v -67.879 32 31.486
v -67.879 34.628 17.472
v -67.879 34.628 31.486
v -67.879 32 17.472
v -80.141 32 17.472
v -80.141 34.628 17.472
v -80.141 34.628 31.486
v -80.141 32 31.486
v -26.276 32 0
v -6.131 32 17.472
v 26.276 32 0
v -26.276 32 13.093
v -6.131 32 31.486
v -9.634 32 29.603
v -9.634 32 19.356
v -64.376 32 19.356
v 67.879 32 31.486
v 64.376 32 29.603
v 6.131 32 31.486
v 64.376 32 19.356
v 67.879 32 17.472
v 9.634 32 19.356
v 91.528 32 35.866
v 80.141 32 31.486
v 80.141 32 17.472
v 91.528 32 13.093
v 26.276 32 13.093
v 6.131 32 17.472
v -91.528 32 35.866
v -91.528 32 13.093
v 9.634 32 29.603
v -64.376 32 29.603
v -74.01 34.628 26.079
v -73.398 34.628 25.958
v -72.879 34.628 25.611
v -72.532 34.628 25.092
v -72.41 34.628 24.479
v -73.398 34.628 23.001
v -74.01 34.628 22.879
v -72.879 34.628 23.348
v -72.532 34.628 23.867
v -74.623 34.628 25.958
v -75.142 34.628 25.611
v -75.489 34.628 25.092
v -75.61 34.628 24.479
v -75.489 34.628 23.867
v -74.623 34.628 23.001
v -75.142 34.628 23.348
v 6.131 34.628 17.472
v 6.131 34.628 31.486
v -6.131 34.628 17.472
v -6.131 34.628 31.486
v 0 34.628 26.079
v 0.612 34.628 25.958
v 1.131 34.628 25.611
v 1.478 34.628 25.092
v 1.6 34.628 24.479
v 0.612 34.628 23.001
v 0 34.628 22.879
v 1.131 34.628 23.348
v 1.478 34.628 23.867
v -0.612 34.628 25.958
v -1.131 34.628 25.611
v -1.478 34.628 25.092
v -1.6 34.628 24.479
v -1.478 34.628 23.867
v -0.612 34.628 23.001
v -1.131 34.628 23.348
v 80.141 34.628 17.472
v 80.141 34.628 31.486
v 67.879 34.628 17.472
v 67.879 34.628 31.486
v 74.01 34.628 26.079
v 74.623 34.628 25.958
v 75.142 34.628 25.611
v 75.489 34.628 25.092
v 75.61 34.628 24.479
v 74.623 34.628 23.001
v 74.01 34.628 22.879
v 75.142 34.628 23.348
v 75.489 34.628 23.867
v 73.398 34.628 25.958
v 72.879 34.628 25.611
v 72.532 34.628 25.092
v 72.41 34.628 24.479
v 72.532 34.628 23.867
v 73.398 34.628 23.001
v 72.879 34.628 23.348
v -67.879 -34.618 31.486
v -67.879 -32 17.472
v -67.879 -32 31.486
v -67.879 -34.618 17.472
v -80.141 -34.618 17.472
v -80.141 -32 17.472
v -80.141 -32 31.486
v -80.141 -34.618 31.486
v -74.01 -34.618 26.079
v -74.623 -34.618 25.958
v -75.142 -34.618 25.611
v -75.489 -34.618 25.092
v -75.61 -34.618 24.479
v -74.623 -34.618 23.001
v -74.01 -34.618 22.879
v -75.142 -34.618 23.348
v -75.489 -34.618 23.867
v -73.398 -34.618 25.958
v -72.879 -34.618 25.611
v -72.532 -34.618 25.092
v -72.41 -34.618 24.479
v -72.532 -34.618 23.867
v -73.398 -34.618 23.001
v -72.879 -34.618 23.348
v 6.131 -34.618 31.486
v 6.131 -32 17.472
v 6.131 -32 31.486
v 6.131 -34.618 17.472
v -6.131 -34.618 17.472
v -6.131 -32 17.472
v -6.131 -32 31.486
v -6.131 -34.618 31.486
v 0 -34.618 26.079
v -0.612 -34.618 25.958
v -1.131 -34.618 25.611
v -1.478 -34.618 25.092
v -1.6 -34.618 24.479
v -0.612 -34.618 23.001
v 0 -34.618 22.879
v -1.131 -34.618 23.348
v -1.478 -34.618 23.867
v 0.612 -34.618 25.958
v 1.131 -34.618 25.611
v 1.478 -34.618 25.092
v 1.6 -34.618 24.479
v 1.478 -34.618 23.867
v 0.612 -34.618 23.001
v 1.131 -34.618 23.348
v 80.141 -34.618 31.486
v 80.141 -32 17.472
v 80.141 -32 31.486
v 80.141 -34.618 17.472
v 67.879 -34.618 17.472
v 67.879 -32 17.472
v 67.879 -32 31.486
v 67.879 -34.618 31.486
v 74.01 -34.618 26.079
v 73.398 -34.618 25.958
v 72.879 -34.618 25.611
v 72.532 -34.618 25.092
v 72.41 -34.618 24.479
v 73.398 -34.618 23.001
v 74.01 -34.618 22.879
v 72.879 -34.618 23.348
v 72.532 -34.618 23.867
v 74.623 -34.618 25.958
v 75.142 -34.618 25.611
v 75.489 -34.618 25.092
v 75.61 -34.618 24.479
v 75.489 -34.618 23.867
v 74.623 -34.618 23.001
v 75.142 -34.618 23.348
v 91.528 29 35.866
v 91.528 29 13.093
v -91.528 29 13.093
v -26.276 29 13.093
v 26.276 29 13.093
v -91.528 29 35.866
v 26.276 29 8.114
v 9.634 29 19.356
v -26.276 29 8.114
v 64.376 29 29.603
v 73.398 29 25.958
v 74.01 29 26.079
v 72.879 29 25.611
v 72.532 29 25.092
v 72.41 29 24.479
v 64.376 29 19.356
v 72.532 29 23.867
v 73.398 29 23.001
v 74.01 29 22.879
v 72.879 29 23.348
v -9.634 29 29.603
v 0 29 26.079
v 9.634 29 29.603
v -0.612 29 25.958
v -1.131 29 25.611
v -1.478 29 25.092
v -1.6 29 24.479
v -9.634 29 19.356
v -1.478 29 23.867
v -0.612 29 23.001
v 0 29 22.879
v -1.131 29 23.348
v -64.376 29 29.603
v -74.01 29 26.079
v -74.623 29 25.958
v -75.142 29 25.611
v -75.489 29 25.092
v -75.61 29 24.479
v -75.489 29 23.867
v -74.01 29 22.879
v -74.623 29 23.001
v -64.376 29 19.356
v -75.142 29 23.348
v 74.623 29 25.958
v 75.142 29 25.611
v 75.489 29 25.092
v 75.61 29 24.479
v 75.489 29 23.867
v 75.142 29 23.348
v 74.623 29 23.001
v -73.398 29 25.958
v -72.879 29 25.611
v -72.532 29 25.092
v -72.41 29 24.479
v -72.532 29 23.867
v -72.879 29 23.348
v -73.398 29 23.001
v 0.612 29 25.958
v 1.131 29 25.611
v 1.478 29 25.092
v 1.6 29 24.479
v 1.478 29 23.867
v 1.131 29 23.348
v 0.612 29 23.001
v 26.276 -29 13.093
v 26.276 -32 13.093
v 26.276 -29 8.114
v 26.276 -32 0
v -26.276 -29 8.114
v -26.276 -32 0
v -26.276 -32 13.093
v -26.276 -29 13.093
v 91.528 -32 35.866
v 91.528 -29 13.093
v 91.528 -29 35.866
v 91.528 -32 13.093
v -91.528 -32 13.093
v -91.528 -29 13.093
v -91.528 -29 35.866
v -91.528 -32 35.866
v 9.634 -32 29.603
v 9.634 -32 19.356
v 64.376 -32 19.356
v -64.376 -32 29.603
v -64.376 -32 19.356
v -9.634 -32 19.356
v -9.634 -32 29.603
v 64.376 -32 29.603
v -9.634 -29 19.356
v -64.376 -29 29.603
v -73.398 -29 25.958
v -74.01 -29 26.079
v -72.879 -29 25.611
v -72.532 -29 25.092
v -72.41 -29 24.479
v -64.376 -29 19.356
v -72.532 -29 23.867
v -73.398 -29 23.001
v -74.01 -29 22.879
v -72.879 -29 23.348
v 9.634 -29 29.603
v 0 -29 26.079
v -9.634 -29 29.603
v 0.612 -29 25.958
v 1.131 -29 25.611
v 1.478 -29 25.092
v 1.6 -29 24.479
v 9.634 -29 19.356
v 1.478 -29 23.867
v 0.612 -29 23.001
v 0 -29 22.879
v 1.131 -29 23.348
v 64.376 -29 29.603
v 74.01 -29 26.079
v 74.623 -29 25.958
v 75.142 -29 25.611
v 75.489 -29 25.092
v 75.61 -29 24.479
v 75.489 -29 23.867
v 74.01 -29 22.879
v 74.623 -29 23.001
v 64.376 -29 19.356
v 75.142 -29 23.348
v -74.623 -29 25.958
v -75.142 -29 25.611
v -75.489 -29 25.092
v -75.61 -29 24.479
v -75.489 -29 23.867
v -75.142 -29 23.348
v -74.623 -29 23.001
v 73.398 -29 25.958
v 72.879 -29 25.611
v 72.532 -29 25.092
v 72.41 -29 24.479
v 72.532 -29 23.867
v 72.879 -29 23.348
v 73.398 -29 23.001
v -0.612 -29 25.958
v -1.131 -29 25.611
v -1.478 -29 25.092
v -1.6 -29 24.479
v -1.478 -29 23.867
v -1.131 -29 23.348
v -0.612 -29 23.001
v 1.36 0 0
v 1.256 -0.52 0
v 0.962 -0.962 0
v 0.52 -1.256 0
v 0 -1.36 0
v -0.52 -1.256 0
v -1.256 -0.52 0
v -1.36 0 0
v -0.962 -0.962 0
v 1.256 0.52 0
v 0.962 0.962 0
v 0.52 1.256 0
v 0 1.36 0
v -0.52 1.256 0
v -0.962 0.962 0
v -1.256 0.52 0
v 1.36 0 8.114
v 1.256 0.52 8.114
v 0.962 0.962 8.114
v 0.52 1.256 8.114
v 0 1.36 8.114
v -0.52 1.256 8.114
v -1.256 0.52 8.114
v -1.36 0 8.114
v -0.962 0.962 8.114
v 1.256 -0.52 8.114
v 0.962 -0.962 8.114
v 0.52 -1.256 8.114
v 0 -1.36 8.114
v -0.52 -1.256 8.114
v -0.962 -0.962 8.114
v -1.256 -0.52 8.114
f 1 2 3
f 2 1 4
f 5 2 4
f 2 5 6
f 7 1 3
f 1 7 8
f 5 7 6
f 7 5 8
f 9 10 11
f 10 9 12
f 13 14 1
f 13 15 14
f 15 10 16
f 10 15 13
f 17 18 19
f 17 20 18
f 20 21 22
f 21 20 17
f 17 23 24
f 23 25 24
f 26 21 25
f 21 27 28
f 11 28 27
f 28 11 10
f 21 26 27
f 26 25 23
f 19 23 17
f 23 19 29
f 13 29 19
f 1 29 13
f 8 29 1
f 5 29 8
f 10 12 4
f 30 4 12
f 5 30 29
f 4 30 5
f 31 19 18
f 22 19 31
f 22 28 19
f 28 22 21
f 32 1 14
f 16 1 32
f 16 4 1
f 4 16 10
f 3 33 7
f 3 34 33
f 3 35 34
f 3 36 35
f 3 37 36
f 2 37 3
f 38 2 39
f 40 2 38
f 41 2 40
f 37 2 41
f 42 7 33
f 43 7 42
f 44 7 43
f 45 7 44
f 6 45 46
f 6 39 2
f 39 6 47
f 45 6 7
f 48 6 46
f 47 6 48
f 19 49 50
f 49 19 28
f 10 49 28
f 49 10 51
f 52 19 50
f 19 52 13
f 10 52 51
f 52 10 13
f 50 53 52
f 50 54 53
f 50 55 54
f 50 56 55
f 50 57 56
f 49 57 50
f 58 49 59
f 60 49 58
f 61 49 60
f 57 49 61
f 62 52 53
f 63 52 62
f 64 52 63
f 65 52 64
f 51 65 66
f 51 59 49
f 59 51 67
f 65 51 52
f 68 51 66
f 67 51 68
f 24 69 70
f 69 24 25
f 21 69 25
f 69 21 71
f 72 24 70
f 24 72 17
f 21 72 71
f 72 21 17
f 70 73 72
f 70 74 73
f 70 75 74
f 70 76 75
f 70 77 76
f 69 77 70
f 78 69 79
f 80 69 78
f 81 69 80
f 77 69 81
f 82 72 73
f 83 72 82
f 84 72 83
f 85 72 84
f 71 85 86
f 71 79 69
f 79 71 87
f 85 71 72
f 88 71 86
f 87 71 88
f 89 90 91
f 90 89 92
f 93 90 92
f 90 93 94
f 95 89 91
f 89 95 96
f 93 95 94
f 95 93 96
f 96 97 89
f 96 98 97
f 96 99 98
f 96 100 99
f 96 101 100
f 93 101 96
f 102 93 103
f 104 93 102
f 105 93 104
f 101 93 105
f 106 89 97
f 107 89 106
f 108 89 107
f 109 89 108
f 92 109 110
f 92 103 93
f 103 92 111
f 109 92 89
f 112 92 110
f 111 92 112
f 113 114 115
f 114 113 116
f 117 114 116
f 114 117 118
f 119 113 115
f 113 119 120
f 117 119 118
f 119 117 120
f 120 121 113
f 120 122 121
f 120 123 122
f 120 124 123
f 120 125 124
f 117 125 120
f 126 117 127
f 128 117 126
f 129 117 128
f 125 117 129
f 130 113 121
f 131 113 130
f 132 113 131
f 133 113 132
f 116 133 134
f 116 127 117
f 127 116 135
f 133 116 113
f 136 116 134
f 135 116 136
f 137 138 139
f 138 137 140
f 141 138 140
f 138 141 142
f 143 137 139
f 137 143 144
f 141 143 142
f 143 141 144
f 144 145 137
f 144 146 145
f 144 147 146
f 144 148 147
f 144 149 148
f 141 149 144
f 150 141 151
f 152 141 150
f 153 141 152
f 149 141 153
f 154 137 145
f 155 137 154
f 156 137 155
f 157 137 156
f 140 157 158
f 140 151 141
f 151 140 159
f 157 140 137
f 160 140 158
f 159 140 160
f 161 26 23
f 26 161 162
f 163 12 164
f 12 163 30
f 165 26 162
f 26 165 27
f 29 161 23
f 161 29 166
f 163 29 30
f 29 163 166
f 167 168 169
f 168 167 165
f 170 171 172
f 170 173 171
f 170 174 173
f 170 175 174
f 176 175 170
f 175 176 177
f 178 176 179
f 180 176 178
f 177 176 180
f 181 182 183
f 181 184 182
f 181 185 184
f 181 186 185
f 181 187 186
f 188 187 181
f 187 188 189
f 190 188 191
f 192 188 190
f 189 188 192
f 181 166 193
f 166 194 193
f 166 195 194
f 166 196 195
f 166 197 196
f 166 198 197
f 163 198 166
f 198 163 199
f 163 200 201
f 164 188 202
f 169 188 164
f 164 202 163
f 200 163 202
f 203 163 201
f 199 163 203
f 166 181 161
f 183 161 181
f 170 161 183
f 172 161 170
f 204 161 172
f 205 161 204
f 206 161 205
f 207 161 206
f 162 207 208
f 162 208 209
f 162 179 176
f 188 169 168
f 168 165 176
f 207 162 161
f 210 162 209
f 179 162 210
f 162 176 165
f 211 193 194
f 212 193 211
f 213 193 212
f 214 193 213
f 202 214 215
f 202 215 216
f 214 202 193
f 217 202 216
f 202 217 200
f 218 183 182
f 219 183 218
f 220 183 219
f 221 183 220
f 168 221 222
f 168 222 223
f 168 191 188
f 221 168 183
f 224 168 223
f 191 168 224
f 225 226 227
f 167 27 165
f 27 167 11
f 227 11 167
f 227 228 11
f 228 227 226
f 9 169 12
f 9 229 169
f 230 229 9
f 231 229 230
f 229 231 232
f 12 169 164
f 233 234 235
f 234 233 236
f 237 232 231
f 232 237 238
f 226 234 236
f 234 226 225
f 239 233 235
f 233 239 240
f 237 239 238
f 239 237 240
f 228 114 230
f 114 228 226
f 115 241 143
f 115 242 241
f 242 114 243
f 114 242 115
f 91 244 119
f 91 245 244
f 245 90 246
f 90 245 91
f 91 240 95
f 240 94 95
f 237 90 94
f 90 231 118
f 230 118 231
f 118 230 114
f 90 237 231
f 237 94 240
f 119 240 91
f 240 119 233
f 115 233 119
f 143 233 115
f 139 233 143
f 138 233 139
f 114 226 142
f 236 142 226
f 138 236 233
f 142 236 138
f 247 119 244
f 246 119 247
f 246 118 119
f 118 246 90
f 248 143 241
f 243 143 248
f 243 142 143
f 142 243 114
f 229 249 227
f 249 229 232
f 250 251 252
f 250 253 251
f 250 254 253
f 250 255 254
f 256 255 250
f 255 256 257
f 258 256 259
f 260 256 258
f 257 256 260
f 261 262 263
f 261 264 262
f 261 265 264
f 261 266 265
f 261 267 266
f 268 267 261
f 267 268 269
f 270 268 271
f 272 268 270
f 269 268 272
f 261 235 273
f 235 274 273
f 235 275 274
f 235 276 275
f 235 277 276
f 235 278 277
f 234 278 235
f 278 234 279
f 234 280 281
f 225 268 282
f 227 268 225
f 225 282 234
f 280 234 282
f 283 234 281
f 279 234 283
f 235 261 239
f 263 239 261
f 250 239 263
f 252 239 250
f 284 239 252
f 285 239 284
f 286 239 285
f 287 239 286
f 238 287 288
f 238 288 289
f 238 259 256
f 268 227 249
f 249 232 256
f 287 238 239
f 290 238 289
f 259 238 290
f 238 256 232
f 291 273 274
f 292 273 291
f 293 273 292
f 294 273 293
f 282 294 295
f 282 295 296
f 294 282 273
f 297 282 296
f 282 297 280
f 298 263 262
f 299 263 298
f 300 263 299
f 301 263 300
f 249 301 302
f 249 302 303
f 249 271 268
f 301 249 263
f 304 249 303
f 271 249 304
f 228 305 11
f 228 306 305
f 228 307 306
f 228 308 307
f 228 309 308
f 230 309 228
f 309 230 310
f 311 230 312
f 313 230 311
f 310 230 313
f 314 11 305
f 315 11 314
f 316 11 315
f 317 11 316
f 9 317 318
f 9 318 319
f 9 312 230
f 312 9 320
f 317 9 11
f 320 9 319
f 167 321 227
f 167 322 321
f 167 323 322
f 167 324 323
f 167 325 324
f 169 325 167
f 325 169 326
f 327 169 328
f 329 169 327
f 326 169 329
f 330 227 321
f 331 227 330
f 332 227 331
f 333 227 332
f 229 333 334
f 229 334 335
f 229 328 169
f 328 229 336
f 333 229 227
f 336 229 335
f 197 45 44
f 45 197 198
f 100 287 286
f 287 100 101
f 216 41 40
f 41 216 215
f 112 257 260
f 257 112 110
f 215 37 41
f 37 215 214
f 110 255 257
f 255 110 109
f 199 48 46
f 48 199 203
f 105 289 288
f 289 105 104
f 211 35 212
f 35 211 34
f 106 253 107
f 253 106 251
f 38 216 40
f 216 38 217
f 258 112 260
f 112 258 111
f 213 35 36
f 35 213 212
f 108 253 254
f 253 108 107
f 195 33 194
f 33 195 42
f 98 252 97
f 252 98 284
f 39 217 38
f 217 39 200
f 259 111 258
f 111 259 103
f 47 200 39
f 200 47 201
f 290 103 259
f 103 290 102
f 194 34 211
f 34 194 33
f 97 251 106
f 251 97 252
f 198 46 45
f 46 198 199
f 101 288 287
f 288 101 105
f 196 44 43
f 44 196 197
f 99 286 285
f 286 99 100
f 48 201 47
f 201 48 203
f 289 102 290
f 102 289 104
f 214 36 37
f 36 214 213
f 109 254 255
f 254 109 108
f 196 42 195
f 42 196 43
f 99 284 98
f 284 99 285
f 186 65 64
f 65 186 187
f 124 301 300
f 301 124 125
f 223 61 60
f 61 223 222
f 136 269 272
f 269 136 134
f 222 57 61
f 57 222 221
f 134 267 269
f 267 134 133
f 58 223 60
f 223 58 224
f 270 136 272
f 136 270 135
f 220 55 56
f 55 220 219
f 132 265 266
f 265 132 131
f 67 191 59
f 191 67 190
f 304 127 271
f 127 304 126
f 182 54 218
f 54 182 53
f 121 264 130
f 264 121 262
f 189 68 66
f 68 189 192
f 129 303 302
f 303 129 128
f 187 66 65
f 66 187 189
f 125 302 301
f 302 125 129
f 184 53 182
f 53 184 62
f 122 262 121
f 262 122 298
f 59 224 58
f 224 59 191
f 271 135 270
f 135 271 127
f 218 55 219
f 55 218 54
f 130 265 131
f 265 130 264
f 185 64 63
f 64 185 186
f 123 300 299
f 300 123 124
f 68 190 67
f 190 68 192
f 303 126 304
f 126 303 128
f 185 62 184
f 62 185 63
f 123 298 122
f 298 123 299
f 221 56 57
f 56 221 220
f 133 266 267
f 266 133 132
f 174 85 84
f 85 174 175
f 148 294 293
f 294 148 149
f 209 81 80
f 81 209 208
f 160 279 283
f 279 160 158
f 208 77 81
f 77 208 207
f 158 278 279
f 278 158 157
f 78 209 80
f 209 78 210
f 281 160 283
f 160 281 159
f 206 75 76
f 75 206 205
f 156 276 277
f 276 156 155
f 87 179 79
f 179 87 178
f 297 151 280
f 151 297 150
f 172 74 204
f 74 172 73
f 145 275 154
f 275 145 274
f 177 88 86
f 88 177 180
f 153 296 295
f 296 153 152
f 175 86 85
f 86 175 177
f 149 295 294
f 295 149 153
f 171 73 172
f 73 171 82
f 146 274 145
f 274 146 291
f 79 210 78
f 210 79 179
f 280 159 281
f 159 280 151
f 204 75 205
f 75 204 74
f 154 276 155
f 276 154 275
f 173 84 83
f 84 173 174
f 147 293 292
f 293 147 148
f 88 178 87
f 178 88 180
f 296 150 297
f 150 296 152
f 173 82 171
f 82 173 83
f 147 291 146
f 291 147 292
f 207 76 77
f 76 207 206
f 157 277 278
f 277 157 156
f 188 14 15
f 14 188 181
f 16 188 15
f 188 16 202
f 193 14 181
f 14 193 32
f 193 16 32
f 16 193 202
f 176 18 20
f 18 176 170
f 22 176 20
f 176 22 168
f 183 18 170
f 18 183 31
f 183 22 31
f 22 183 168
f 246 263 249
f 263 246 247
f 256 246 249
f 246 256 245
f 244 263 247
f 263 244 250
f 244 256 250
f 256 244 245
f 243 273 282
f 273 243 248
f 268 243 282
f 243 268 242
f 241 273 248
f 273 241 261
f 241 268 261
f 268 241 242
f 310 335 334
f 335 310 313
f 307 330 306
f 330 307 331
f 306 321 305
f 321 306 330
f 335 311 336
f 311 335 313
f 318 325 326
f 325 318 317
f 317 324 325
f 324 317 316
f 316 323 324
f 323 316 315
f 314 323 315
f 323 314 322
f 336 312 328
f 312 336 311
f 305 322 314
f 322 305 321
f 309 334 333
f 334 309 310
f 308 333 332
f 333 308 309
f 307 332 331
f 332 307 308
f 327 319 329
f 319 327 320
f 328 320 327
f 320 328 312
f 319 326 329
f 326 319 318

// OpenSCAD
// file: ../../library/e7_all.scad
// ==========================================================================
//  e7_all.scad - include this one file. Preview, print plates and the report.
// ==========================================================================
include <e7_params.scad>
include <e7_body.scad>

// whole painted loco
module e7_preview() {
  // carbody in its paint bands
  for (i = [0:len(PAINT_BANDS) - 1]) {
    z0 = i == 0 ? -1 : p(PAINT_BANDS[i - 1][0]);
    z1 = i == len(PAINT_BANDS) - 1 ? 1000 : p(PAINT_BANDS[i][0]);
    color(PAINT_BANDS[i][1]) render(convexity = 8) e7_shell_solid([z0, z1]);
  }
  color(C_GLASS) e7_glass();
  color(C_LENS) let (d = nose_d_at_z(HEADLIGHT[0]))
    translate([XF - p(d) + p(HEADLIGHT[2]) + p(1.5), 0, p(HEADLIGHT[0])]) rotate([0, 90, 0]) cylinder(d = p(HEADLIGHT[1]) - 0.8, h = 0.5, $fn = 32);
  color(C_FRAME) { for (j = [1:NFRAME]) e7_frame_piece(j); e7_pilot(); e7_pilot_rear(); }
  for (tx = [TRK_X, -TRK_X]) translate([tx, 0, 0]) { color(C_TRUCK) e7_truck_frame(); color(C_WHEEL) e7_wheels(); }
}
// thin glass panes sitting in the window pockets (preview only)
module e7_glass() {
  intersection() { e7_loft(DET * 0.6); union() { e7_windshield_cut(); e7_side_cuts_windows_only(); } }
}
module e7_side_cuts_windows_only() {
  for (s = [-1, 1], w = CAB_WIN)
    translate([XF - p(w[1]), s * HW - (s > 0 ? DET : 3 - DET), p(w[2])]) cube([p(w[1] - w[0]), 3, p(w[3] - w[2])]);
}

// one print, laid out for the printer
module e7_plate(part) {
  sec = [for (k = [1:NSEC]) str("body_", k)];
  frm = [for (j = [1:NFRAME]) str("frame_", j)];
  if (is_num(search([part], sec)[0])) {
    k = search([part], sec)[0] + 1;
    // stand the section on its open bottom (skirt edge on the bed)
    translate([-sec_x0(k) - SEC_L / 2, 0, -Z_SKIRT]) e7_body_section(k);
  } else if (is_num(search([part], frm)[0])) {
    j = search([part], frm)[0] + 1;
    xs = concat([FRAME_X0], FRAME_SPLITS, [FRAME_X1]);
    translate([-(xs[j - 1] + xs[j]) / 2, 0, -Z_FRAME_BOT]) e7_frame_piece(j);
  } else if (part == "pilot") {
    translate([-XF, 0, 0]) rotate([0, 0, 0]) translate([0, 0, -p(5)]) e7_pilot();
  } else if (part == "pilot_rear") {
    translate([-XR, 0, 0]) translate([0, 0, -(CPL_Z - CPL_H / 2 - WALL)]) e7_pilot_rear();
  } else if (part == "truck") {
    // upside down, bolster on the bed
    translate([0, 0, Z_FRAME_BOT - 0.3]) rotate([180, 0, 0]) e7_truck_frame();
  } else {
    assert(false, str("unknown part '", part, "'"));
  }
}

module e7_report() {
  echo(str("MILW E7A ", ROAD_NO, " class ", CLASS, " - ", SC, " scale 1:", RATIO, ", paint ", PAINT));
  echo(str("  carbody ", round(BL), " mm long, ", round(2 * HW), " mm wide, roof ", round(Z_ROOF), " mm, cab ", round(Z_CAB), " mm above rail"));
  echo(str("  ", NSEC, " body sections of ", round(SEC_L), " mm; ", NFRAME, " frame pieces; trucks at +/- ", round(TRK_X), " mm"));
  echo(str("  body screws ", SCREW_BODY_NAME, " x ", 2 * len(BOSS_X), "; truck pivots ", PIVOT[1], "; wheels ", round(WHEEL_D * 10) / 10, " mm (bought)"));
}
// main file
// Milwaukee Road E7A, G scale 1-29 - print 12 of 12: truck - A1A truck frame (print bolster down; make 2)
// Render (F6), export STL, print. Settings: ../../library/e7_params.scad
// Whole loco preview and notes: ../../MILW_E7_Main.scad
SCALE_SEL = "G";
include <../../library/e7_all.scad>
e7_plate("truck");
